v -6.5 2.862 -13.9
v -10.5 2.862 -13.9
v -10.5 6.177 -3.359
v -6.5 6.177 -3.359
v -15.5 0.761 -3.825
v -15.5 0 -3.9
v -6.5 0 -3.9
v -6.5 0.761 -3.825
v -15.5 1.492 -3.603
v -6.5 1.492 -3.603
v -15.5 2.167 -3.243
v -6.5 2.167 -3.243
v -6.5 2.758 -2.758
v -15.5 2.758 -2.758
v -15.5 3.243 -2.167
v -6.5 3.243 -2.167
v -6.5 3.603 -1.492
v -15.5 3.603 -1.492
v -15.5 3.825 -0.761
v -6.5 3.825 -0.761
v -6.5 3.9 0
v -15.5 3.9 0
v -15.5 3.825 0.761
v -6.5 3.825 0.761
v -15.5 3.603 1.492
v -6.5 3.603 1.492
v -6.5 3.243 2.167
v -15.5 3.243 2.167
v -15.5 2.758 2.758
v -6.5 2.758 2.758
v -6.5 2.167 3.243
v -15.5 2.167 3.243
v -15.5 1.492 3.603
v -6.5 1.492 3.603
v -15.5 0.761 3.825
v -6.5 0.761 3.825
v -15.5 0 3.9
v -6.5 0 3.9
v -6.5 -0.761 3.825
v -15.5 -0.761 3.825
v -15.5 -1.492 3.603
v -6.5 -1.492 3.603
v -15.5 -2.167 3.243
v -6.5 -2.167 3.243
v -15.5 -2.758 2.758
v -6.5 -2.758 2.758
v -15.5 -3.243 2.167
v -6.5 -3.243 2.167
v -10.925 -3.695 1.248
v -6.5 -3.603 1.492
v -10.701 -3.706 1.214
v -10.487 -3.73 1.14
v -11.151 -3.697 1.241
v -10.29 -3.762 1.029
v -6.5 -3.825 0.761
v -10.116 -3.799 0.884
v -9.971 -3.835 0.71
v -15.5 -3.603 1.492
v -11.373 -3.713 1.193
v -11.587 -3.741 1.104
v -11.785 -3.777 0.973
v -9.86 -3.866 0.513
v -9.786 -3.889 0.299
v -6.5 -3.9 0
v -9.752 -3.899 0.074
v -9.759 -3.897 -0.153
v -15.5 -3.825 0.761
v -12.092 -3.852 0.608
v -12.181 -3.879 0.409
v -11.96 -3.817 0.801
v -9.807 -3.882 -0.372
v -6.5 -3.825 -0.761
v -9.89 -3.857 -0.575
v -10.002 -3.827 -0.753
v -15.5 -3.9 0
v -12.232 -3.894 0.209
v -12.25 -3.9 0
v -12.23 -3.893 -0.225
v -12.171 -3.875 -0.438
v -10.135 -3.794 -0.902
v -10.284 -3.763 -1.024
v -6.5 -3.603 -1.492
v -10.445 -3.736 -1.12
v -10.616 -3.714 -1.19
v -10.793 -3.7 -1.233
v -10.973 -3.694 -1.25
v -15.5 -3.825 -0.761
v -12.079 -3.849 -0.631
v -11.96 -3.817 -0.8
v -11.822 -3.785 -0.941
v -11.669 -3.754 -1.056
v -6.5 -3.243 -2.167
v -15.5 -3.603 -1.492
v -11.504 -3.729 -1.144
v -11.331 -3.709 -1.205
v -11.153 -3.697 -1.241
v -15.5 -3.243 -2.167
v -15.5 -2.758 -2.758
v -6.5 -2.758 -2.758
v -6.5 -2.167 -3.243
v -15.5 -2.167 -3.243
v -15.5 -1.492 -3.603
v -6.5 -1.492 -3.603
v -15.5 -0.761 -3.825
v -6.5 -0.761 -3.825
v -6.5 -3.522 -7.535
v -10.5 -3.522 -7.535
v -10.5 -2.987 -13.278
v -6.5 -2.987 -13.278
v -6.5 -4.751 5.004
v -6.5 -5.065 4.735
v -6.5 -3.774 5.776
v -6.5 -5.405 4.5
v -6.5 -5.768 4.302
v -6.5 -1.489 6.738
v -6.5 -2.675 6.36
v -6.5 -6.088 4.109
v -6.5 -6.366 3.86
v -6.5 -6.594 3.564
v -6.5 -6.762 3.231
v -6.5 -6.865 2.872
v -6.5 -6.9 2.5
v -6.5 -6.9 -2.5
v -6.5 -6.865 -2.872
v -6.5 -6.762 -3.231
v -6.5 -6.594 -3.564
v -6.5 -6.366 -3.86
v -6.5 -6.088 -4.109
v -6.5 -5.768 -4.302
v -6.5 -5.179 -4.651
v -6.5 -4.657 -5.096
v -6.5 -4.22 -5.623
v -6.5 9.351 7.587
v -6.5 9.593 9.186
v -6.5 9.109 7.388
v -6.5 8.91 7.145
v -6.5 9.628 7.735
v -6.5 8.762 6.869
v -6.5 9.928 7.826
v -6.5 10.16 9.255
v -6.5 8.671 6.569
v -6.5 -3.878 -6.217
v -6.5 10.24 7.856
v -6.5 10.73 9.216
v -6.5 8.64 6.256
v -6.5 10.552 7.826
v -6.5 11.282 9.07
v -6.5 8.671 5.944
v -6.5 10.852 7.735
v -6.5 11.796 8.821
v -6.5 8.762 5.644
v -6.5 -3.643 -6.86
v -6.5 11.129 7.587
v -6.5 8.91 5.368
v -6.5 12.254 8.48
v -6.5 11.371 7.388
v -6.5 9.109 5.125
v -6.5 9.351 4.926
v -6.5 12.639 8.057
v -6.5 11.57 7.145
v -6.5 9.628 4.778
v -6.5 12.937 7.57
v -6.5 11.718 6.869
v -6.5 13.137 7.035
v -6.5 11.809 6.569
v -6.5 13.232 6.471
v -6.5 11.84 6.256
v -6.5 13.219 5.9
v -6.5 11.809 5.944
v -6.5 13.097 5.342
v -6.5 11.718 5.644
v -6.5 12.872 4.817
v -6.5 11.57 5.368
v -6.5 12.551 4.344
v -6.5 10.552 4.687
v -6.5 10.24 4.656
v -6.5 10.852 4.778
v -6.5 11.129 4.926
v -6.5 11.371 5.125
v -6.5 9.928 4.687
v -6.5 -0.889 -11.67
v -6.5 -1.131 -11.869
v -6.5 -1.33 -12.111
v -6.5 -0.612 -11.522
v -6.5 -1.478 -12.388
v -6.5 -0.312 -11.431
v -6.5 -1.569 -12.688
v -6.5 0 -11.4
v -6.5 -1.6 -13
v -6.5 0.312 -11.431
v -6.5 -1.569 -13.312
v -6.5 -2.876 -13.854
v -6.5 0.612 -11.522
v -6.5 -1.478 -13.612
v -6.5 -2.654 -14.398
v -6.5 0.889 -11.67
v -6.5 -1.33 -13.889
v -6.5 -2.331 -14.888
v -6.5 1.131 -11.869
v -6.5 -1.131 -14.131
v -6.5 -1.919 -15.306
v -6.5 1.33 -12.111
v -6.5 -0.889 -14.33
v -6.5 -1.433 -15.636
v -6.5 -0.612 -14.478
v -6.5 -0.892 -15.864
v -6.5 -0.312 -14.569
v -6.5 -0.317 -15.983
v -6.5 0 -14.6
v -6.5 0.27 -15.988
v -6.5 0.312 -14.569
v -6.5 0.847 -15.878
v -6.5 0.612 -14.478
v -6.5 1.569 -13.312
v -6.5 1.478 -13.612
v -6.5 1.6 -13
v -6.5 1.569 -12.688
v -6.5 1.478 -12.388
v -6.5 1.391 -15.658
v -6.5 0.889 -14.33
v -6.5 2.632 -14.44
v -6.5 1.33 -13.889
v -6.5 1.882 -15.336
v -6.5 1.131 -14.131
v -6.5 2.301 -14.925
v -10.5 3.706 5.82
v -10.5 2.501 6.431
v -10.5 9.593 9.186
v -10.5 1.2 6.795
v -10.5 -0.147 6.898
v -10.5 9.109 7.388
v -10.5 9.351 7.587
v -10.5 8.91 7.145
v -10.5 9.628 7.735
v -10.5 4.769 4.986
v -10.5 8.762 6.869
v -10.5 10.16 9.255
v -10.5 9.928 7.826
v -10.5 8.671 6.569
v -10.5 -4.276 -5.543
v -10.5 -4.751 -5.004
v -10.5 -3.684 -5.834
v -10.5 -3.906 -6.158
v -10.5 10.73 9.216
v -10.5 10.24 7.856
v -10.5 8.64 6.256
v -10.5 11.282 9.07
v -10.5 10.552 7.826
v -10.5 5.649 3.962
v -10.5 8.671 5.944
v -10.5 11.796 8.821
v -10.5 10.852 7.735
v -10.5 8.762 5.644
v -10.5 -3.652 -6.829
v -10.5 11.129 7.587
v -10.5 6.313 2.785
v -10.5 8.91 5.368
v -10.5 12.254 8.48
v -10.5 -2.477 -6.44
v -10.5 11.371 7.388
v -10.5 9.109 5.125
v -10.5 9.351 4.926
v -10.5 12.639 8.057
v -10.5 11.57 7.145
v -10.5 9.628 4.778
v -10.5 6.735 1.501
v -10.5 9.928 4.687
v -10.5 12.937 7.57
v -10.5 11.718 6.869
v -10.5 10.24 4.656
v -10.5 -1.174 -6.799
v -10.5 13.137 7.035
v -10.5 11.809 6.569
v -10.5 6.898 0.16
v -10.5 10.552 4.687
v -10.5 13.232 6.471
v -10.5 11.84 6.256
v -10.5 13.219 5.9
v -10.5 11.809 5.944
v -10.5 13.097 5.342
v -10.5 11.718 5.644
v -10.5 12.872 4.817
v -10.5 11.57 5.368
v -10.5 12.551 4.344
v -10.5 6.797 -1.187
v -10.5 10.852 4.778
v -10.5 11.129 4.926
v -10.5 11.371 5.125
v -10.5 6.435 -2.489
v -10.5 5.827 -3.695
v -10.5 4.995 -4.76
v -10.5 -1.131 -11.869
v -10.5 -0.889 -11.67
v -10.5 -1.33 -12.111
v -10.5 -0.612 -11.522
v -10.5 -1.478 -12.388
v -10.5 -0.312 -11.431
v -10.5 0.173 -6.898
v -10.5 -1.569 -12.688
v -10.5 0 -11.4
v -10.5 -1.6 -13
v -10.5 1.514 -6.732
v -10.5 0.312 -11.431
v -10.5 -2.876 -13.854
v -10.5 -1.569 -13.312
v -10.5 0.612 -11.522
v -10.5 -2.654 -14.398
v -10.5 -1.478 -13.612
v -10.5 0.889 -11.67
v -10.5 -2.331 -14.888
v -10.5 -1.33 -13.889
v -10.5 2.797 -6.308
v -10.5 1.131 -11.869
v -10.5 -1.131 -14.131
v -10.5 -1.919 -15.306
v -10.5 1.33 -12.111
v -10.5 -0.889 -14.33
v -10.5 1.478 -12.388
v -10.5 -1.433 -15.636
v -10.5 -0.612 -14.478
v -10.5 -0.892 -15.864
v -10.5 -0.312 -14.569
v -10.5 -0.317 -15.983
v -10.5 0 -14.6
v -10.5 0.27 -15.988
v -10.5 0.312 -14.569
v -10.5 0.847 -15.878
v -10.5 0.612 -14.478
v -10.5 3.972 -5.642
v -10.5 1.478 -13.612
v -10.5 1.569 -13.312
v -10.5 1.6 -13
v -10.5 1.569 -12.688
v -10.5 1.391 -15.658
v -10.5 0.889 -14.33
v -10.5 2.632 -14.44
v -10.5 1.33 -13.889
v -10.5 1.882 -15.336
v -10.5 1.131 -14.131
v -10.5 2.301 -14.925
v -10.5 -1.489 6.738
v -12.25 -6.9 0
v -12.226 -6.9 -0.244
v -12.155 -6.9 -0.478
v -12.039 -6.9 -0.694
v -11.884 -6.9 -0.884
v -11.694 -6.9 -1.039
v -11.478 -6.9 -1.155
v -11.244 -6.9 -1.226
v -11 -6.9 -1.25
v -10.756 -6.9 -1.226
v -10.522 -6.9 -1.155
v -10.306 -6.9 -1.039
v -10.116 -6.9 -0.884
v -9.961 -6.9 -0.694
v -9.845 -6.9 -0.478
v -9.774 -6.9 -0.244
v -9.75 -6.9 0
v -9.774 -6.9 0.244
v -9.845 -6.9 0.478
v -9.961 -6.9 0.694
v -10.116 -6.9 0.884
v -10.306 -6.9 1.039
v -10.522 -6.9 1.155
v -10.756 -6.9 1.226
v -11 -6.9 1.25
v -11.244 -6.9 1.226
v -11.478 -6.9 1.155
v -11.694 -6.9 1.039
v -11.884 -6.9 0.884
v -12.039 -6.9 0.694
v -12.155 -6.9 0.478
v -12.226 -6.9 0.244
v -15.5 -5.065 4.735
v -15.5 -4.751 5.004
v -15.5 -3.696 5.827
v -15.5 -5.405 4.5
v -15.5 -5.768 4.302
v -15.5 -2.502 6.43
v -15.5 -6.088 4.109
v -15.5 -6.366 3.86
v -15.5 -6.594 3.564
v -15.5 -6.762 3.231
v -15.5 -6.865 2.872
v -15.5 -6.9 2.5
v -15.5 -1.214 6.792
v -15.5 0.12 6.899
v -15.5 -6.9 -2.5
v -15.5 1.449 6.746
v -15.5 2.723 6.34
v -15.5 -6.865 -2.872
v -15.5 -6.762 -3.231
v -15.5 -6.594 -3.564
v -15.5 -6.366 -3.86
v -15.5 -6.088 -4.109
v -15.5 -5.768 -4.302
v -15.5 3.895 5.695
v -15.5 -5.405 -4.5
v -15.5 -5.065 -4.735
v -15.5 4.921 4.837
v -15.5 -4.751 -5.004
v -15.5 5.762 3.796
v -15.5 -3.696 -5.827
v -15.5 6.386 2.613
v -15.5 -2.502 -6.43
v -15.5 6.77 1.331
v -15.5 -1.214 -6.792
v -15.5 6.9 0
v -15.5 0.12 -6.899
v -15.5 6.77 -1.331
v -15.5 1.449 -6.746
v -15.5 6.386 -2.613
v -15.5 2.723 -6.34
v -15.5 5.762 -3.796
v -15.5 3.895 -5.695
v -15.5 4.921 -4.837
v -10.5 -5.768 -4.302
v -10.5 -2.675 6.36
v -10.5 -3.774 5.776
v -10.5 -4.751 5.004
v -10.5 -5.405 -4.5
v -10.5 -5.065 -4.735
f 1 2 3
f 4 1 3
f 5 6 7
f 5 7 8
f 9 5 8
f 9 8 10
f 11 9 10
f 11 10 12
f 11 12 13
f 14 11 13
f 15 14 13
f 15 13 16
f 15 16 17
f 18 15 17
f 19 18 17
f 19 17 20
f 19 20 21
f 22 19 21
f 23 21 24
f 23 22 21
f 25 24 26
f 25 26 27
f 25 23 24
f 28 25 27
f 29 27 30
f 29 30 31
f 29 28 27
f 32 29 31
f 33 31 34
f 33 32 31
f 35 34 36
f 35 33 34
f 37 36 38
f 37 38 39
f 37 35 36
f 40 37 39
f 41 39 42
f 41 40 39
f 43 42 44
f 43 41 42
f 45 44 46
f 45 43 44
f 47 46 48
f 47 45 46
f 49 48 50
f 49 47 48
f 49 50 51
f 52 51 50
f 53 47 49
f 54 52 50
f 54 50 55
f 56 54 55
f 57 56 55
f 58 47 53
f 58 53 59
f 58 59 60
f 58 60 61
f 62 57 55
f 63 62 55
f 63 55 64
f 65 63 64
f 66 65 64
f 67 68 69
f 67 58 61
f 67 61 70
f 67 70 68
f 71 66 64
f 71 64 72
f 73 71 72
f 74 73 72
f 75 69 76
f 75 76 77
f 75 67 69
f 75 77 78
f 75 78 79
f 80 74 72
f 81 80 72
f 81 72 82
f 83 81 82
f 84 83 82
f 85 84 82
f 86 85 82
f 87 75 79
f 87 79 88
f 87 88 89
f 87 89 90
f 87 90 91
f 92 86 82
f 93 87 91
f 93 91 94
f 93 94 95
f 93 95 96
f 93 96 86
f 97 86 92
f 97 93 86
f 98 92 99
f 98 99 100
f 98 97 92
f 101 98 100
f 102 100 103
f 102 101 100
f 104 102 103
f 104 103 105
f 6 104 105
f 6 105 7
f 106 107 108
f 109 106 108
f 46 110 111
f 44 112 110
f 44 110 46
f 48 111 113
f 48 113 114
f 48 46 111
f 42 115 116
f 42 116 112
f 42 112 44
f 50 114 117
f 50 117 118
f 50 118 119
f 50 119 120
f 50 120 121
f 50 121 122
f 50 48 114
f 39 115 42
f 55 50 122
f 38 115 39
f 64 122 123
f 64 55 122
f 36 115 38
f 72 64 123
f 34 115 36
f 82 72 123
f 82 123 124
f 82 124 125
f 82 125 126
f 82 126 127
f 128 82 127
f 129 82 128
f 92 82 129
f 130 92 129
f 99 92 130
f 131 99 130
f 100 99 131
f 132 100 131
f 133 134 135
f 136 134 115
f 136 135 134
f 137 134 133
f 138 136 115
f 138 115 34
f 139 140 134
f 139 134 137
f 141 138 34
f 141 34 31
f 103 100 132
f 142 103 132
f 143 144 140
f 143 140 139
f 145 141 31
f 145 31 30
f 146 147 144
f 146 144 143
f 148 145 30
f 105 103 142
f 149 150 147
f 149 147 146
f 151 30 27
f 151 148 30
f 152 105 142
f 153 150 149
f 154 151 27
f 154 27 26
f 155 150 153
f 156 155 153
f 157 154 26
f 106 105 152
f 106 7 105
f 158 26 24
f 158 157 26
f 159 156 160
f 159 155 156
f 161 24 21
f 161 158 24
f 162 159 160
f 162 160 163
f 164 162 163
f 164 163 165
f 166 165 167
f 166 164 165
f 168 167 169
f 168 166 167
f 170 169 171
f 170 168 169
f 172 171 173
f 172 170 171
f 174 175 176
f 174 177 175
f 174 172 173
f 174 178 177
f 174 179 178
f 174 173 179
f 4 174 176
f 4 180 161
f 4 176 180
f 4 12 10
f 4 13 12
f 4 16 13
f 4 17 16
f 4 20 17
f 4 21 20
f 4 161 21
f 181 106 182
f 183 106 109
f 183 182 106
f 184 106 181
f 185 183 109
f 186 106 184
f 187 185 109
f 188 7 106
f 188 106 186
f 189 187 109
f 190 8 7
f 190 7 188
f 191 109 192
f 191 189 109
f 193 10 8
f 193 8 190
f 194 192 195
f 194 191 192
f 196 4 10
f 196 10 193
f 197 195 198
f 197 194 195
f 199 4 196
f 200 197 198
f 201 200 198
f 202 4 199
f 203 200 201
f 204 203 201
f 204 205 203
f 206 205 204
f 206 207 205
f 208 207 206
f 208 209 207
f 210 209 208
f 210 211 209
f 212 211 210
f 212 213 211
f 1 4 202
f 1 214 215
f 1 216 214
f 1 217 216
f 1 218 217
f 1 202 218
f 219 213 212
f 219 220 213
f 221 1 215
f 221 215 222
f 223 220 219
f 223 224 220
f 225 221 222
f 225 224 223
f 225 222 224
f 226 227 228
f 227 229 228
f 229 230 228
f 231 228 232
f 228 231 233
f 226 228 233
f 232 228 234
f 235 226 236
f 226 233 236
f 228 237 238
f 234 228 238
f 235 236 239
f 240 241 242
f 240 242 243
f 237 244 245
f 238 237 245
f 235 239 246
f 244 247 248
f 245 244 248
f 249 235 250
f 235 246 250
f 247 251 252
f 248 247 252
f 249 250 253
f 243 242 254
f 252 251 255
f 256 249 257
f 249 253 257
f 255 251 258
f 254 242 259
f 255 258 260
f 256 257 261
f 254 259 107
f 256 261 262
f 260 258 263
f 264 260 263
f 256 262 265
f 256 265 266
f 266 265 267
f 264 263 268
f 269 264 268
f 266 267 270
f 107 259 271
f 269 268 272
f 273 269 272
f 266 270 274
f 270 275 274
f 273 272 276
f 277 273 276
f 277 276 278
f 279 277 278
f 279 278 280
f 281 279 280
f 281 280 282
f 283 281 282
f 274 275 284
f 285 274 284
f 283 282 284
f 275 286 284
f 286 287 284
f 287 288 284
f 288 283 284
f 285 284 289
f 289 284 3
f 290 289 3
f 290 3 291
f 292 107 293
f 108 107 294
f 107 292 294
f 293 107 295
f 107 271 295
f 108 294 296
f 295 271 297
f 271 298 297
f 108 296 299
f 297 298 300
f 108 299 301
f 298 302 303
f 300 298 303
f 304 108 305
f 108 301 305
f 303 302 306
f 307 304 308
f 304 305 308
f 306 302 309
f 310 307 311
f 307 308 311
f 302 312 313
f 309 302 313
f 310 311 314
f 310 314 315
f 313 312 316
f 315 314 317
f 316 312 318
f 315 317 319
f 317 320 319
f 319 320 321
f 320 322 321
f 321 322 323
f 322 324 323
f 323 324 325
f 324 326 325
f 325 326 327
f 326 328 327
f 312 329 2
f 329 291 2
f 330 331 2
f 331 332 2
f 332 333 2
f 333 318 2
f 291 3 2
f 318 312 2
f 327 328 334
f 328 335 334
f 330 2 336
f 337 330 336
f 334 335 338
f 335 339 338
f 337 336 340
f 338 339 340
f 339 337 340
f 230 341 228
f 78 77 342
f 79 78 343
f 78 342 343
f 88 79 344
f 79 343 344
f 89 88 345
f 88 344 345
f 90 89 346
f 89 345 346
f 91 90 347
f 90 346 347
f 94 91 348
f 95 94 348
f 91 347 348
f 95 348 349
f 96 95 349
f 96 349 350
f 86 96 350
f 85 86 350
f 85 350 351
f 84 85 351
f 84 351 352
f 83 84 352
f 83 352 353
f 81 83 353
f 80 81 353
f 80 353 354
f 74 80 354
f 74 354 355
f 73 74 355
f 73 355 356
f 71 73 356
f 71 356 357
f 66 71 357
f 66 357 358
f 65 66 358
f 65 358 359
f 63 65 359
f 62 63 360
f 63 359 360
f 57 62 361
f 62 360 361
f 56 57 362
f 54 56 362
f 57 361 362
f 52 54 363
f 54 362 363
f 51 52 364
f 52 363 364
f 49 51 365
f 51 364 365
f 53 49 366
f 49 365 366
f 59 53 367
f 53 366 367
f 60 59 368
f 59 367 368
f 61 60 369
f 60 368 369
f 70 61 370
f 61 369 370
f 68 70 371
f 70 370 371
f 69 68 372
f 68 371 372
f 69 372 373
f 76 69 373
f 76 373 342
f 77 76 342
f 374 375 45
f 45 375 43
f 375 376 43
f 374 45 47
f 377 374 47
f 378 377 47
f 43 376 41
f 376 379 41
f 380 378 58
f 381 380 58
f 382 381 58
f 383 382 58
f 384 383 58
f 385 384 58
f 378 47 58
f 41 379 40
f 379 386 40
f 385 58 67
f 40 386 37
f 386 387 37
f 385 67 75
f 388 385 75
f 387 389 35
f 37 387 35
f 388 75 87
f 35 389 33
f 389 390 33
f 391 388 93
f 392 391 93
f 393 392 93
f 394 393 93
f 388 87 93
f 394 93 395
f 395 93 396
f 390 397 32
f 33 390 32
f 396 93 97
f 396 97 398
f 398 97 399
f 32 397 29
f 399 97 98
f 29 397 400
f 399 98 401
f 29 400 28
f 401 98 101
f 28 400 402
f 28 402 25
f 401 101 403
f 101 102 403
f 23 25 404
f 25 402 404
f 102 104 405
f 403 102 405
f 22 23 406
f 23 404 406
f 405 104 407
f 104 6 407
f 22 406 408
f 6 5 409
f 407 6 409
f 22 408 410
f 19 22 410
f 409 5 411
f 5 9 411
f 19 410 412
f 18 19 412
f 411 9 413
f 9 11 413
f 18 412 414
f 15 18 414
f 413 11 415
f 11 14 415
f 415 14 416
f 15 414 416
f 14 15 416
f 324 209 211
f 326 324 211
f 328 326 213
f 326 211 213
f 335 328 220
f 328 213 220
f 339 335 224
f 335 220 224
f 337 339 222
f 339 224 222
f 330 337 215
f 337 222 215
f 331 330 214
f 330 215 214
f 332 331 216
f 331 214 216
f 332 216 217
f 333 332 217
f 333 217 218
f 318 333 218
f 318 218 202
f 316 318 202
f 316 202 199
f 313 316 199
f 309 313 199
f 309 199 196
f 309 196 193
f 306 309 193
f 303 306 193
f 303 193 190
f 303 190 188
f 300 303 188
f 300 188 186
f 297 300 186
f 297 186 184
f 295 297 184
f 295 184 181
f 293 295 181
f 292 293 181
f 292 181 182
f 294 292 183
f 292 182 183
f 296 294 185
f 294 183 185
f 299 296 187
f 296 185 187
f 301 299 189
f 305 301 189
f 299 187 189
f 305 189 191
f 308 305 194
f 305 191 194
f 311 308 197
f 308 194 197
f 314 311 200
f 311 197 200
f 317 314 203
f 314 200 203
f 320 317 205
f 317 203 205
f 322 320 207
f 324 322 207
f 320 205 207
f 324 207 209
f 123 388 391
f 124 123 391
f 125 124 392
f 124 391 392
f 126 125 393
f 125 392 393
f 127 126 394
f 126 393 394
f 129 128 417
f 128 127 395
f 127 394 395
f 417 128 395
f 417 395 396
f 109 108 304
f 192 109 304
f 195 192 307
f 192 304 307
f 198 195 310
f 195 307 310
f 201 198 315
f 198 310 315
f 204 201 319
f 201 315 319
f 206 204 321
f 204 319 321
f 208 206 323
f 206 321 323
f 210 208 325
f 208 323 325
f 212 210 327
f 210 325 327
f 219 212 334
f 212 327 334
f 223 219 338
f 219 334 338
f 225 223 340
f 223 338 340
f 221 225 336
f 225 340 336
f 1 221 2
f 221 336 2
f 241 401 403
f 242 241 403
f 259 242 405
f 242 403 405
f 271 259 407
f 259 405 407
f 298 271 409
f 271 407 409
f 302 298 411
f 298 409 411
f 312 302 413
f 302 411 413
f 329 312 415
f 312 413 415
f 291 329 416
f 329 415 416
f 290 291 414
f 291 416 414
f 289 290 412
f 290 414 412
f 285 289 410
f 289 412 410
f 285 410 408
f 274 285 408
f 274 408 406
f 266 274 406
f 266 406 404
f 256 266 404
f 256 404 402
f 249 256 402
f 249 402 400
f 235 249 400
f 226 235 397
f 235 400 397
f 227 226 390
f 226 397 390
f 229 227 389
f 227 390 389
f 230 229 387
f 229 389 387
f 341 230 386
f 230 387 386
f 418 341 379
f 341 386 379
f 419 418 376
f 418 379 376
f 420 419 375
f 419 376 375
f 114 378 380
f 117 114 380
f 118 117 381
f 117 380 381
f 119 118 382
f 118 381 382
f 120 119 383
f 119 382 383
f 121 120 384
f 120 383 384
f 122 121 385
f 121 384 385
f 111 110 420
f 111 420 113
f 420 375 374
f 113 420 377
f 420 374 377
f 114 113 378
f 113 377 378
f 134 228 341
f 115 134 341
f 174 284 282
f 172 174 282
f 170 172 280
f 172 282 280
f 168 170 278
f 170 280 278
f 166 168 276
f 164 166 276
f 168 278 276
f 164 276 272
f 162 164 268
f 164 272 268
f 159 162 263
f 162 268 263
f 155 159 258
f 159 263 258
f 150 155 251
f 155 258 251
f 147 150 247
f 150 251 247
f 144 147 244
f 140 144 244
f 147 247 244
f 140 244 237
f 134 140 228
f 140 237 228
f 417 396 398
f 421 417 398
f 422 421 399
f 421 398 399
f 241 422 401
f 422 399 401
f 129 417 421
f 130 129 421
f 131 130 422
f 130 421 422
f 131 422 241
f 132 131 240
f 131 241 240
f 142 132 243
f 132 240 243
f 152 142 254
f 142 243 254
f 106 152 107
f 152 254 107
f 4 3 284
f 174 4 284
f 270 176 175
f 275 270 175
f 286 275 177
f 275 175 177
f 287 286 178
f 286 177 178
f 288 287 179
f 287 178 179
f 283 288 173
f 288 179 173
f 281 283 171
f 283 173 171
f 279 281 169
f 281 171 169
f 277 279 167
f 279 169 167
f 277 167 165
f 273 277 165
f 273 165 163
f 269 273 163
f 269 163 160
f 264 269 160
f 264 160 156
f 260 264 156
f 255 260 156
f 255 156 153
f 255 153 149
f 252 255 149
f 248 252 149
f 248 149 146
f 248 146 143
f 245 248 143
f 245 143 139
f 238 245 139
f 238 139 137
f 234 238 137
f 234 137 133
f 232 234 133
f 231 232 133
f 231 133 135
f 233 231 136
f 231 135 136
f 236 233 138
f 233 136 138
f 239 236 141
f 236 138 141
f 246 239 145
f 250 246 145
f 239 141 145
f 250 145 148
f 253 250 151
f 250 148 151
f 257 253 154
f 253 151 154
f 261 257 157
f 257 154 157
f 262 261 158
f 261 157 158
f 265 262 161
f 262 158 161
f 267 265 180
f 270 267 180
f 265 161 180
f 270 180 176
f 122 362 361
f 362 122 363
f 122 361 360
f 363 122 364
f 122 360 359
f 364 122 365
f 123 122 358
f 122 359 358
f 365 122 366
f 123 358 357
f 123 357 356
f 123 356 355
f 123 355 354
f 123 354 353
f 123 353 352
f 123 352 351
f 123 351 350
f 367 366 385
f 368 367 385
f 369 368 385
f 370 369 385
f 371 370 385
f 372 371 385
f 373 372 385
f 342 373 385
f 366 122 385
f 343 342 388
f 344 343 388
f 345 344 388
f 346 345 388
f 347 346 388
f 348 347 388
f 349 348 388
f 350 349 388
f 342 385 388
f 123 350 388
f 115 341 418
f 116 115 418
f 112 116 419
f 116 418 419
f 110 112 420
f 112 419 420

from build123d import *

# Parameters (mm, degrees)
BOSS_EXTRUDE1_START     = -10.5
SKETCH2_R               = 3.9
BOSS_EXTRUDE1_DEPTH     = 4
BOSS_EXTRUDE2_START     = -15.5
BOSS_EXTRUDE2_OUTLINE_R = 3.9
BOSS_EXTRUDE2_DEPTH     = 5
M3_CLEARANCE_HOLE1_D    = 3.2
M3_TAPPED_HOLE1_REACH   = 32.031
M3_TAPPED_HOLE1_BORE_R  = 1.25


# Read off the part's stored shape, not the designer's step: Boss-Extrude2
with BuildPart() as part:
    # Sketch2 → Boss-Extrude1 (new body)
    with BuildSketch(Plane(origin=(0, 0, 0), x_dir=(0, 0, -1), z_dir=(1, 0, 0)).offset(BOSS_EXTRUDE1_START)):
        with BuildLine():
            Line((7.534547605, -3.521676906), (13.278030312, -2.987088741))
            ThreePointArc((13.278030312, -2.987088741), (15.983180385, -0.317229866), (13.9, 2.861817604))
            Line((13.9, 2.861817604), (3.358528015, 6.176957176))
            Line((3.358528015, 6.176957176), (-4.343824749, 12.551142838))
            ThreePointArc((-4.343824749, 12.551142838), (-7.820620852, 12.799917558), (-9.185849324, 9.592714537))
            Line((-9.185849324, 9.592714537), (-6.737511079, -1.488604871))
            ThreePointArc((-6.737511079, -1.488604871), (-6.093212803, -3.237708717), (-5.004243793, -4.750530924))
            ThreePointArc((-5.004243793, -4.750530924), (-4.613436828, -5.232032538), (-4.301751563, -5.768153965))
            ThreePointArc((-4.301751563, -5.768153965), (-3.563882529, -6.593562507), (-2.5, -6.9))
            Line((-2.5, -6.9), (2.5, -6.9))
            ThreePointArc((2.5, -6.9), (3.563882529, -6.593562507), (4.301751563, -5.768153965))
            ThreePointArc((4.301751563, -5.768153965), (5.622657157, -4.219686633), (7.534547605, -3.521676906))
        make_face()
        Circle(SKETCH2_R, mode=Mode.SUBTRACT)
    extrude(amount=BOSS_EXTRUDE1_DEPTH)

    # Boss-Extrude2 outline → Boss-Extrude2 (add)
    with BuildSketch(Plane(origin=(0, 0, 0), x_dir=(0, 0, -1), z_dir=(1, 0, 0)).offset(BOSS_EXTRUDE2_START)):
        with BuildLine():
            ThreePointArc((5.004243793, -4.750530924), (0, 6.9), (-5.004243793, -4.750530924))
            ThreePointArc((-5.004243793, -4.750530924), (-4.613436828, -5.232032538), (-4.301751563, -5.768153965))
            ThreePointArc((-4.301751563, -5.768153965), (-3.563882529, -6.593562507), (-2.5, -6.9))
            Line((-2.5, -6.9), (2.5, -6.9))
            ThreePointArc((2.5, -6.9), (3.563882529, -6.593562507), (4.301751563, -5.768153965))
            ThreePointArc((4.301751563, -5.768153965), (4.613436828, -5.232032538), (5.004243793, -4.750530924))
        make_face()
        Circle(BOSS_EXTRUDE2_OUTLINE_R, mode=Mode.SUBTRACT)
    extrude(amount=BOSS_EXTRUDE2_DEPTH)

    # M3 Clearance Hole1 (through all)
    with Locations(Plane.ZY.offset(10.5)):
        with Locations((-13, 0), (6.256496681, 10.239934047)):
            Hole(M3_CLEARANCE_HOLE1_D / 2)

    # M3 Tapped Hole1 bore → M3 Tapped Hole1 (cut, up to next)
    with BuildSketch(Plane(origin=(0, -6.9, 0), x_dir=(-1, 0, 0), z_dir=(0, -1, 0)), mode=Mode.PRIVATE) as m3_tapped_hole1_sk1:
        with Locations((11, 0)):
            Circle(M3_TAPPED_HOLE1_BORE_R)
    m3_tapped_hole1_tool1 = extrude(m3_tapped_hole1_sk1.sketch, amount=-M3_TAPPED_HOLE1_REACH, mode=Mode.PRIVATE) & part.part
    add(m3_tapped_hole1_tool1.solids().sort_by_distance((-11, -6.9, 0))[0], mode=Mode.SUBTRACT)


solid = part.part
